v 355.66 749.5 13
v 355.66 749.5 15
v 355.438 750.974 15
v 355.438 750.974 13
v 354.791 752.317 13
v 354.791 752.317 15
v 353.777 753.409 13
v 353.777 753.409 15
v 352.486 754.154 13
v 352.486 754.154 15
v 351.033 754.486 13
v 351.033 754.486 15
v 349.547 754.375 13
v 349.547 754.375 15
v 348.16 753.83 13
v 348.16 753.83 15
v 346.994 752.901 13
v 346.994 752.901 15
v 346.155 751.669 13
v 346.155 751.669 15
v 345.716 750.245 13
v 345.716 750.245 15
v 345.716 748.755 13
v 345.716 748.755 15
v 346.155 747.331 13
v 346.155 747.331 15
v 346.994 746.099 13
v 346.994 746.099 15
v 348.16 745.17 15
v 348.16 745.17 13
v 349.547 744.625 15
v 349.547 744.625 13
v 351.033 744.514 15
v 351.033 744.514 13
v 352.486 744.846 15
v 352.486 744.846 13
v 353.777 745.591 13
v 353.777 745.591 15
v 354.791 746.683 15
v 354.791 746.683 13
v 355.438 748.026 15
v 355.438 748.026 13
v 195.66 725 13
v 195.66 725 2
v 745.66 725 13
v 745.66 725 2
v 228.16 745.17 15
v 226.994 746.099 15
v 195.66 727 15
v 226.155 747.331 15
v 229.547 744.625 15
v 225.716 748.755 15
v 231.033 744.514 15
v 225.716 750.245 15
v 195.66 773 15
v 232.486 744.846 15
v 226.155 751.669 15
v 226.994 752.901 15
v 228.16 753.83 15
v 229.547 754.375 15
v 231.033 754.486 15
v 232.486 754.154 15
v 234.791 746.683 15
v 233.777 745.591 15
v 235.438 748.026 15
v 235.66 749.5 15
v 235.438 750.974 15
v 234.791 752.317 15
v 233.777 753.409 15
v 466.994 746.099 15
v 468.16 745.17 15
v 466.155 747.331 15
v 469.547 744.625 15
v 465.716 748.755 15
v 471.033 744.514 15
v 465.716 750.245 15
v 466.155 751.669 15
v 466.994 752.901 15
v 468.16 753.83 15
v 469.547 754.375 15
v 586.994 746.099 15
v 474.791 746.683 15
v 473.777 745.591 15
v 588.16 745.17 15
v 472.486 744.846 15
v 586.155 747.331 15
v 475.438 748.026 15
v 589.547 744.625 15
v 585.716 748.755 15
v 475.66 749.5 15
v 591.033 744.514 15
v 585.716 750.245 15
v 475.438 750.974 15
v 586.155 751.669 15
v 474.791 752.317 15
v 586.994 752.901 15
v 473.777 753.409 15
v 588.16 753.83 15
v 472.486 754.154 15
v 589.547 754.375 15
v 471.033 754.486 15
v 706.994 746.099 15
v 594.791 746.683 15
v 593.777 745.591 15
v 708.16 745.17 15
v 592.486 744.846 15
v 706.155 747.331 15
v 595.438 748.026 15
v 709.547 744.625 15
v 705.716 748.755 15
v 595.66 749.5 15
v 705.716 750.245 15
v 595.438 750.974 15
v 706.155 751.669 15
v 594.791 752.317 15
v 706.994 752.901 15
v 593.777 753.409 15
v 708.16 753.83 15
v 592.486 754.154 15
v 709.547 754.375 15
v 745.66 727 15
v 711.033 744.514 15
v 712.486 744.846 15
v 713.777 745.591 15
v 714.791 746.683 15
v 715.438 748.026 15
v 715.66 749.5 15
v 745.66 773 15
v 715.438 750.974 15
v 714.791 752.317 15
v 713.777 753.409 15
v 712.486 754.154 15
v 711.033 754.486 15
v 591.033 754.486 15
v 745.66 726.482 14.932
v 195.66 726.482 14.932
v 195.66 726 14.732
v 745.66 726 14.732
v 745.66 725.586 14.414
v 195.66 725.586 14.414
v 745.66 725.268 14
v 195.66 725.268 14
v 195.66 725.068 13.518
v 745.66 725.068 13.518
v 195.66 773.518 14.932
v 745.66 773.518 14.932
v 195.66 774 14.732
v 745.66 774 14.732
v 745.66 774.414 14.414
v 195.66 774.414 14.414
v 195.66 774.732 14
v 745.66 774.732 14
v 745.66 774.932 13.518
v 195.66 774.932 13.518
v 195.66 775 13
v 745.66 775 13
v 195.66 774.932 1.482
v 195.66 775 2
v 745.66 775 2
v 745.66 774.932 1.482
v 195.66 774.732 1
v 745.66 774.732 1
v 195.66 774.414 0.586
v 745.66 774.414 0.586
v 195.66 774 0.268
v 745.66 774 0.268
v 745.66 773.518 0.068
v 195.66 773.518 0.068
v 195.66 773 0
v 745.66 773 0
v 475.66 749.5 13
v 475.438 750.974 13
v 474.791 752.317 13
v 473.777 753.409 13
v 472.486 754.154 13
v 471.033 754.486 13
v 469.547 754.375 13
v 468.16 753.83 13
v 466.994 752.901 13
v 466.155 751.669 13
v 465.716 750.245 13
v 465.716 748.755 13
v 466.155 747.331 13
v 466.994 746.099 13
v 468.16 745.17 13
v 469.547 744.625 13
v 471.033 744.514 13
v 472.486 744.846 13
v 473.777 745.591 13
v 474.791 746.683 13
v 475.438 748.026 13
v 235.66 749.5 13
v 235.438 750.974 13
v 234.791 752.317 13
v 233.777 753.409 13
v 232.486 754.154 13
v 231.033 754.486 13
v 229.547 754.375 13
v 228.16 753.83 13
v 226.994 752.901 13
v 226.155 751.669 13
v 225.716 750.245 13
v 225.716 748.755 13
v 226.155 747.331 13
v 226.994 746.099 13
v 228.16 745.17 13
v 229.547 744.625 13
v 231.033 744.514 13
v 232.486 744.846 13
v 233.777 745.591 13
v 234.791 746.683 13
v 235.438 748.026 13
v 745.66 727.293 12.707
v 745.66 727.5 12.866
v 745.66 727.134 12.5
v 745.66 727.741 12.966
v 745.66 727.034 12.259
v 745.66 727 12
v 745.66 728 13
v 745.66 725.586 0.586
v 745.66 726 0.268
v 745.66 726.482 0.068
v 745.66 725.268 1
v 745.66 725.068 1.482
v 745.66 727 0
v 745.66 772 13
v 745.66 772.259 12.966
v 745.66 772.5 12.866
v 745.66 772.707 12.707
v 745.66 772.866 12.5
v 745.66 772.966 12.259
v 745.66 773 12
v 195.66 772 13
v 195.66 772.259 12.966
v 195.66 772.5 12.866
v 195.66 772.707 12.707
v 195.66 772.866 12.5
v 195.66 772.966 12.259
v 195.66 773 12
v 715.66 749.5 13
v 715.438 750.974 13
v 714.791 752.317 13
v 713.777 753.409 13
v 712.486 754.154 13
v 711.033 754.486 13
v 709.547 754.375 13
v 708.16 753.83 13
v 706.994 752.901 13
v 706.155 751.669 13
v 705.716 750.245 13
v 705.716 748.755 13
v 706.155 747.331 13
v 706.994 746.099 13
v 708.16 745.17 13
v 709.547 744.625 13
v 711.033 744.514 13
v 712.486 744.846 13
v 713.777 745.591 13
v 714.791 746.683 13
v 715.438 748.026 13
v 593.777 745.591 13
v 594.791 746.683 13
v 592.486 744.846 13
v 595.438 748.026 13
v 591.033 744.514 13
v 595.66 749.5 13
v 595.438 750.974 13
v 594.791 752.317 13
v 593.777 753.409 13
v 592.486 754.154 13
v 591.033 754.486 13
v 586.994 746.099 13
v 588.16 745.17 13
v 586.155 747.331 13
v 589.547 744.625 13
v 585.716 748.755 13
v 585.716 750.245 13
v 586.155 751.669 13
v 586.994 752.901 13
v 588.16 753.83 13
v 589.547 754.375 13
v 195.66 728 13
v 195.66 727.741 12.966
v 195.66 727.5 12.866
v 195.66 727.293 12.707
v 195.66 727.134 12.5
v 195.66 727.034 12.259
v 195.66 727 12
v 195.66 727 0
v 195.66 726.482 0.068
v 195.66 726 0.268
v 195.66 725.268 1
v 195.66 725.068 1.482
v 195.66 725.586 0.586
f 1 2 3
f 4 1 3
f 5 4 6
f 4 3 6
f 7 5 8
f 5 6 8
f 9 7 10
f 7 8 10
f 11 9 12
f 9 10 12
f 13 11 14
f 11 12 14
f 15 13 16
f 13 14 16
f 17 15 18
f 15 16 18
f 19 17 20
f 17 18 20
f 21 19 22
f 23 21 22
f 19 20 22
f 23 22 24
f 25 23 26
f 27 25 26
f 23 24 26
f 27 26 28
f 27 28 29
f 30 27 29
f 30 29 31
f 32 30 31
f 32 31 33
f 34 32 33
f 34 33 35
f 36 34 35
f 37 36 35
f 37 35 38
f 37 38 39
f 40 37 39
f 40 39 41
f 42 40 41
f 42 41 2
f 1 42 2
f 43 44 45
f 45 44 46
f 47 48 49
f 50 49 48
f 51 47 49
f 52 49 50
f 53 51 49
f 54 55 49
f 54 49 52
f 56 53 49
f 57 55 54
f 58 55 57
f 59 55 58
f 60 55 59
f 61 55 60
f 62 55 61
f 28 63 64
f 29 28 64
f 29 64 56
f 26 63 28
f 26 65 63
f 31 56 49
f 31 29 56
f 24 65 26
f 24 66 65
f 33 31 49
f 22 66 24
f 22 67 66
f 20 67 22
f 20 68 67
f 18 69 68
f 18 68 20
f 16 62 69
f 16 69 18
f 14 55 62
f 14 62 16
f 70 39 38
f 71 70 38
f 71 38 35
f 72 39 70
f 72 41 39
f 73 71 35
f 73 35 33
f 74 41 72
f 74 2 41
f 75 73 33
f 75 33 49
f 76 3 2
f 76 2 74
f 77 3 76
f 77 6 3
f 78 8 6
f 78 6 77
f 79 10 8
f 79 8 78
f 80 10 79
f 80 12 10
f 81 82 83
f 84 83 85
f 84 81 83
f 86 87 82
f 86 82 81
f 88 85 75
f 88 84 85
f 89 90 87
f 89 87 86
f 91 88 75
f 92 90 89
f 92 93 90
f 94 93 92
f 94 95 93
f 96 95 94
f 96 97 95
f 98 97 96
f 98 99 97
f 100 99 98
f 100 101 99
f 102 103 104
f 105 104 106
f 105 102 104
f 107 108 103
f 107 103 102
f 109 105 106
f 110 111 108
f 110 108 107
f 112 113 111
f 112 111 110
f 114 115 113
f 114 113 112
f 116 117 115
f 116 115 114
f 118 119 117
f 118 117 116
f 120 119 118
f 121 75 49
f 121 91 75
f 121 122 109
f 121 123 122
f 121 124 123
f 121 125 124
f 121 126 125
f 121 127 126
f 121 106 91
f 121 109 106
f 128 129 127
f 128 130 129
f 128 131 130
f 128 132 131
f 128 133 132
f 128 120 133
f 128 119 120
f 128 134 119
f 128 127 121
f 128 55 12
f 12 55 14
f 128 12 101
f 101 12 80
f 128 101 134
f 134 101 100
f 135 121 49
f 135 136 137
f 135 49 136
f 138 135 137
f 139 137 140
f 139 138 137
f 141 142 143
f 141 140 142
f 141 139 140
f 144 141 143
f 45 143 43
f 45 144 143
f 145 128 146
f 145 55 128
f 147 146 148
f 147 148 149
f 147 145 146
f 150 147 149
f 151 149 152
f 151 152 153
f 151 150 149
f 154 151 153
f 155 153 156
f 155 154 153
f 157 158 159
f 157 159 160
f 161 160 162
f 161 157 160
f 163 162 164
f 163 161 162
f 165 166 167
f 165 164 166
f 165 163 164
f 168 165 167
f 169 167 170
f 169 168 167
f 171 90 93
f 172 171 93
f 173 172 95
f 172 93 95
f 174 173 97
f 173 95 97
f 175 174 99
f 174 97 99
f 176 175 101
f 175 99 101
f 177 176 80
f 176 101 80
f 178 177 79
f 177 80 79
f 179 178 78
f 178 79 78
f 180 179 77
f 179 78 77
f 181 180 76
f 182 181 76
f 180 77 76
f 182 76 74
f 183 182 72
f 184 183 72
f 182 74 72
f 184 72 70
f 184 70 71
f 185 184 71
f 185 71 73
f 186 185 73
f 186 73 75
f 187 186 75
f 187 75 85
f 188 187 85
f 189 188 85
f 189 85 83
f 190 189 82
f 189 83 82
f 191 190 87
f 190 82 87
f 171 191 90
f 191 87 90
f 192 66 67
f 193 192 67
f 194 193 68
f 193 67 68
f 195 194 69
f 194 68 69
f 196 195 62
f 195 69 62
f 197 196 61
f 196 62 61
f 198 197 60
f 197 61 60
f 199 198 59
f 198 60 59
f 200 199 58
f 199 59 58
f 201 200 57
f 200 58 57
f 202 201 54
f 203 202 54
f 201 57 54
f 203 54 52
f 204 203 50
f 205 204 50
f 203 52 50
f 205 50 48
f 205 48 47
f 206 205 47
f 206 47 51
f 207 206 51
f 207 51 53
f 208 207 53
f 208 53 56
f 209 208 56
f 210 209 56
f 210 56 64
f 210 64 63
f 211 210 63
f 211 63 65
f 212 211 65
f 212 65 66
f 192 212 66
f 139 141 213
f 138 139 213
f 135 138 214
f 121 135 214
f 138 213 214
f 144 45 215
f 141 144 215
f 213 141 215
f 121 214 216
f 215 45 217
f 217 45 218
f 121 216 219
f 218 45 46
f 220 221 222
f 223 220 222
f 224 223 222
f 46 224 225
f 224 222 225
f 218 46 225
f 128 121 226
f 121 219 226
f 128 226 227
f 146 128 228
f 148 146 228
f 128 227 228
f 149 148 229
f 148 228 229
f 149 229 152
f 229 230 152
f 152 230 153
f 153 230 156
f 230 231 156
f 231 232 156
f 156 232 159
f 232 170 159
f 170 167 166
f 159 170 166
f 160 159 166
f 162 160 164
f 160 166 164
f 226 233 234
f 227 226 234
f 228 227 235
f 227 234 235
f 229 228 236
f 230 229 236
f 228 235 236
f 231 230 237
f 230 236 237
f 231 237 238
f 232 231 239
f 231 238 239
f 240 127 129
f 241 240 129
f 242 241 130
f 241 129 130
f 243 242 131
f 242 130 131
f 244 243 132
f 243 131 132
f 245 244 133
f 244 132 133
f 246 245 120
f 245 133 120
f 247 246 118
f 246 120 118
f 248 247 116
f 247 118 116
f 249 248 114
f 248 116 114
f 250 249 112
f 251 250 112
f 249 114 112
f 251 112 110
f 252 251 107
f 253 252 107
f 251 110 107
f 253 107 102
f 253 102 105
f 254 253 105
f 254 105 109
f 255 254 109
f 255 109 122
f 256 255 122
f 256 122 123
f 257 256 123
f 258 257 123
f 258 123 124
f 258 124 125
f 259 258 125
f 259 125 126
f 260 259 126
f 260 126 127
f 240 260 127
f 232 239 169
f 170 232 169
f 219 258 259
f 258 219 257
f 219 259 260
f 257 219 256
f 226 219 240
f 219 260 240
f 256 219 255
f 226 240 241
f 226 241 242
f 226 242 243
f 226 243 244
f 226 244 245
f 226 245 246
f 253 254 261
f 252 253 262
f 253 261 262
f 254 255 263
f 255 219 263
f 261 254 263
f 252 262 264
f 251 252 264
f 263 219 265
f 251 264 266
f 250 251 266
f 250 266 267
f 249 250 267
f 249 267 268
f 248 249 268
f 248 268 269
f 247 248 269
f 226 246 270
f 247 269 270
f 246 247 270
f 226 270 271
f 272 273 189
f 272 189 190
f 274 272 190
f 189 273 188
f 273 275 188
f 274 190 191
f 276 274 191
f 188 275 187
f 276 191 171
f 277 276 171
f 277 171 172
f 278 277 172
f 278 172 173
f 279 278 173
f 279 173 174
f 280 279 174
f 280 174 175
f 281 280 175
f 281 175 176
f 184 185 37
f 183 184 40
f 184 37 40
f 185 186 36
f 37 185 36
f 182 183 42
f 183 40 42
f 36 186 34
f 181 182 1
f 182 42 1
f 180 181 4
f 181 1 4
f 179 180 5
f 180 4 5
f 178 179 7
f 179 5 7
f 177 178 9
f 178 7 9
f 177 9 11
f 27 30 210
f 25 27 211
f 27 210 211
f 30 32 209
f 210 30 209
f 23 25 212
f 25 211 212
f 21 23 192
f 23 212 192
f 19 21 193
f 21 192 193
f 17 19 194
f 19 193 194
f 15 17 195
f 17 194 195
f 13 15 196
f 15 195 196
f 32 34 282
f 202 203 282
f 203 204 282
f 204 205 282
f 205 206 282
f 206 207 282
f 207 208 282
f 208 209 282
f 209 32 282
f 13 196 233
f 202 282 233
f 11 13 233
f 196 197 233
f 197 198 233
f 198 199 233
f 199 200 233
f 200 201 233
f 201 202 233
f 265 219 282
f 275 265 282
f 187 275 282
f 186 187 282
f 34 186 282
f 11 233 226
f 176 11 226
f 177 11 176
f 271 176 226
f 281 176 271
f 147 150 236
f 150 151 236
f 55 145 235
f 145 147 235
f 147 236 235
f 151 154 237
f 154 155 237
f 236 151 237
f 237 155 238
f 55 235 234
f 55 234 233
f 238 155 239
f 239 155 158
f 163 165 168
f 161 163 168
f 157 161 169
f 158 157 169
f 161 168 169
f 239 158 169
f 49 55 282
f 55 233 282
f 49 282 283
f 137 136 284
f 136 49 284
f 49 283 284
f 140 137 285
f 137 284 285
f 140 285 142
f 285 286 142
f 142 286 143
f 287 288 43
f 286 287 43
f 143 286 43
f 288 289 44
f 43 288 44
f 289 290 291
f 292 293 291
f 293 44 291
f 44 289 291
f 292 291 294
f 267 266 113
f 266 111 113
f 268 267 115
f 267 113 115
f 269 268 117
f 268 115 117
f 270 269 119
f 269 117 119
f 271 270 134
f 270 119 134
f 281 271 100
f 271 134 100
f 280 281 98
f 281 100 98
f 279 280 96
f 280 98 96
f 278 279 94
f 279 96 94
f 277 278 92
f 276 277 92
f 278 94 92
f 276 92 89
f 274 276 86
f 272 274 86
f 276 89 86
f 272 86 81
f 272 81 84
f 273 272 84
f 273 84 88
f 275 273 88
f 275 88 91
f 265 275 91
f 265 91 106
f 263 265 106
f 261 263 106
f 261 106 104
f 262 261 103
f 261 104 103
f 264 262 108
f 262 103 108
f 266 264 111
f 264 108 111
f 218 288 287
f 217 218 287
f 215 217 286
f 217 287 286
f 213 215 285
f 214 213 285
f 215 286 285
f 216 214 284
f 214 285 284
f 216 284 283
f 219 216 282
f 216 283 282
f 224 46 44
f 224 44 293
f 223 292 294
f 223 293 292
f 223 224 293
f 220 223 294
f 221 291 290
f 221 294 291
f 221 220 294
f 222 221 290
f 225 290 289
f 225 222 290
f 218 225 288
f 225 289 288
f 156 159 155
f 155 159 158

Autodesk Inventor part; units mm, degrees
ref_plane "YZ Plane" through (0, 0, 0) normal (1, 0, 0) x (0, 1, 0)
ref_plane "XZ Plane" through (0, 0, 0) normal (0, 1, 0) x (-1, 0, 0)
ref_plane "Work Plane1" through (0, 0, 0) normal (0, 0, 1) x (1, 0, 0)
sketch "Sketch1" plane through (0, 0, 0) normal (0, 0, 1) x (1, 0, 0)
  line L0 (195.6597, 725) -> (745.6597, 725)
  line L1 (745.6597, 725) -> (745.6597, 775)
  line L2 (745.6597, 775) -> (195.6597, 775)
  line L3 (195.6597, 775) -> (195.6597, 725)
  line L4 (164.0316, 10) -> (164.0316, 1490) projected
  line L5 (777.2877, 10) -> (164.0316, 10) projected
  line L6 (470.6597, 10) -> (470.6597, 1506) construction
  line L7 (164.0316, 750) -> (680, 750) construction
  point P0 (0, 0)
  point P1 (470.6597, 725)
  point P2 (195.6597, 750)
  dimension "d0" = 550
  dimension "d1" = 50
extrude "Extrusion1" add sketch "Sketch1" along normal blind 15
sketch "Sketch2" plane through (195.6597, 725, 0) normal (-1, 0, 0) x (0, 0, 1)
  line L0 (15, 0) -> (0, 0) projected
  line L1 (0, 0) -> (0, 50) projected
  line L2 (0, 50) -> (15, 50) projected
  line L3 (15, 50) -> (15, 0) projected
  line L4 (12, 48) -> (0, 48)
  line L5 (0, 2) -> (12, 2)
  line L6 (13, 3) -> (13, 47)
  arc A0 (13, 47) -> (12, 48) centre (12, 47) ccw
  arc A1 (12, 2) -> (13, 3) centre (12, 3) ccw
  point P0 (0, -725)
  dimension "d5" = 2
extrude "Extrusion2" cut sketch "Sketch2" against normal through all contours L1 L4 A0 L6 A1 L5
fillet "Fillet1" radius 2 4 edges at (470.6597, 775, 15) (470.6597, 775, 0) (470.6597, 725, 0) (470.6597, 725, 15)
sketch "Sketch3" plane through (0, 0, 15) normal (0, 0, 1) x (1, 0, 0)
  line L0 (195.6597, 727) -> (745.6597, 727) construction
  line L1 (745.6597, 773) -> (745.6597, 727) construction
  line L2 (745.6597, 773) -> (195.6597, 773) construction
  line L3 (195.6597, 727) -> (195.6597, 773) construction
  line L4 (195.6597, 772) -> (745.6597, 772) projected
  line L5 (470.6597, 772) -> (470.6597, 727) construction
  circle A0 centre (470.6597, 749.5) radius 5
  point P0 (0, 0)
  dimension "d10" = 10
extrude "Extrusion3" cut sketch "Sketch3" against normal up to next
pattern_linear "Rectangular Pattern1" count 5 spacing 120 along (1, 0, 0) of "Extrusion3" first direction both ways yes
properties part number "support1" material "Stainless Steel"
